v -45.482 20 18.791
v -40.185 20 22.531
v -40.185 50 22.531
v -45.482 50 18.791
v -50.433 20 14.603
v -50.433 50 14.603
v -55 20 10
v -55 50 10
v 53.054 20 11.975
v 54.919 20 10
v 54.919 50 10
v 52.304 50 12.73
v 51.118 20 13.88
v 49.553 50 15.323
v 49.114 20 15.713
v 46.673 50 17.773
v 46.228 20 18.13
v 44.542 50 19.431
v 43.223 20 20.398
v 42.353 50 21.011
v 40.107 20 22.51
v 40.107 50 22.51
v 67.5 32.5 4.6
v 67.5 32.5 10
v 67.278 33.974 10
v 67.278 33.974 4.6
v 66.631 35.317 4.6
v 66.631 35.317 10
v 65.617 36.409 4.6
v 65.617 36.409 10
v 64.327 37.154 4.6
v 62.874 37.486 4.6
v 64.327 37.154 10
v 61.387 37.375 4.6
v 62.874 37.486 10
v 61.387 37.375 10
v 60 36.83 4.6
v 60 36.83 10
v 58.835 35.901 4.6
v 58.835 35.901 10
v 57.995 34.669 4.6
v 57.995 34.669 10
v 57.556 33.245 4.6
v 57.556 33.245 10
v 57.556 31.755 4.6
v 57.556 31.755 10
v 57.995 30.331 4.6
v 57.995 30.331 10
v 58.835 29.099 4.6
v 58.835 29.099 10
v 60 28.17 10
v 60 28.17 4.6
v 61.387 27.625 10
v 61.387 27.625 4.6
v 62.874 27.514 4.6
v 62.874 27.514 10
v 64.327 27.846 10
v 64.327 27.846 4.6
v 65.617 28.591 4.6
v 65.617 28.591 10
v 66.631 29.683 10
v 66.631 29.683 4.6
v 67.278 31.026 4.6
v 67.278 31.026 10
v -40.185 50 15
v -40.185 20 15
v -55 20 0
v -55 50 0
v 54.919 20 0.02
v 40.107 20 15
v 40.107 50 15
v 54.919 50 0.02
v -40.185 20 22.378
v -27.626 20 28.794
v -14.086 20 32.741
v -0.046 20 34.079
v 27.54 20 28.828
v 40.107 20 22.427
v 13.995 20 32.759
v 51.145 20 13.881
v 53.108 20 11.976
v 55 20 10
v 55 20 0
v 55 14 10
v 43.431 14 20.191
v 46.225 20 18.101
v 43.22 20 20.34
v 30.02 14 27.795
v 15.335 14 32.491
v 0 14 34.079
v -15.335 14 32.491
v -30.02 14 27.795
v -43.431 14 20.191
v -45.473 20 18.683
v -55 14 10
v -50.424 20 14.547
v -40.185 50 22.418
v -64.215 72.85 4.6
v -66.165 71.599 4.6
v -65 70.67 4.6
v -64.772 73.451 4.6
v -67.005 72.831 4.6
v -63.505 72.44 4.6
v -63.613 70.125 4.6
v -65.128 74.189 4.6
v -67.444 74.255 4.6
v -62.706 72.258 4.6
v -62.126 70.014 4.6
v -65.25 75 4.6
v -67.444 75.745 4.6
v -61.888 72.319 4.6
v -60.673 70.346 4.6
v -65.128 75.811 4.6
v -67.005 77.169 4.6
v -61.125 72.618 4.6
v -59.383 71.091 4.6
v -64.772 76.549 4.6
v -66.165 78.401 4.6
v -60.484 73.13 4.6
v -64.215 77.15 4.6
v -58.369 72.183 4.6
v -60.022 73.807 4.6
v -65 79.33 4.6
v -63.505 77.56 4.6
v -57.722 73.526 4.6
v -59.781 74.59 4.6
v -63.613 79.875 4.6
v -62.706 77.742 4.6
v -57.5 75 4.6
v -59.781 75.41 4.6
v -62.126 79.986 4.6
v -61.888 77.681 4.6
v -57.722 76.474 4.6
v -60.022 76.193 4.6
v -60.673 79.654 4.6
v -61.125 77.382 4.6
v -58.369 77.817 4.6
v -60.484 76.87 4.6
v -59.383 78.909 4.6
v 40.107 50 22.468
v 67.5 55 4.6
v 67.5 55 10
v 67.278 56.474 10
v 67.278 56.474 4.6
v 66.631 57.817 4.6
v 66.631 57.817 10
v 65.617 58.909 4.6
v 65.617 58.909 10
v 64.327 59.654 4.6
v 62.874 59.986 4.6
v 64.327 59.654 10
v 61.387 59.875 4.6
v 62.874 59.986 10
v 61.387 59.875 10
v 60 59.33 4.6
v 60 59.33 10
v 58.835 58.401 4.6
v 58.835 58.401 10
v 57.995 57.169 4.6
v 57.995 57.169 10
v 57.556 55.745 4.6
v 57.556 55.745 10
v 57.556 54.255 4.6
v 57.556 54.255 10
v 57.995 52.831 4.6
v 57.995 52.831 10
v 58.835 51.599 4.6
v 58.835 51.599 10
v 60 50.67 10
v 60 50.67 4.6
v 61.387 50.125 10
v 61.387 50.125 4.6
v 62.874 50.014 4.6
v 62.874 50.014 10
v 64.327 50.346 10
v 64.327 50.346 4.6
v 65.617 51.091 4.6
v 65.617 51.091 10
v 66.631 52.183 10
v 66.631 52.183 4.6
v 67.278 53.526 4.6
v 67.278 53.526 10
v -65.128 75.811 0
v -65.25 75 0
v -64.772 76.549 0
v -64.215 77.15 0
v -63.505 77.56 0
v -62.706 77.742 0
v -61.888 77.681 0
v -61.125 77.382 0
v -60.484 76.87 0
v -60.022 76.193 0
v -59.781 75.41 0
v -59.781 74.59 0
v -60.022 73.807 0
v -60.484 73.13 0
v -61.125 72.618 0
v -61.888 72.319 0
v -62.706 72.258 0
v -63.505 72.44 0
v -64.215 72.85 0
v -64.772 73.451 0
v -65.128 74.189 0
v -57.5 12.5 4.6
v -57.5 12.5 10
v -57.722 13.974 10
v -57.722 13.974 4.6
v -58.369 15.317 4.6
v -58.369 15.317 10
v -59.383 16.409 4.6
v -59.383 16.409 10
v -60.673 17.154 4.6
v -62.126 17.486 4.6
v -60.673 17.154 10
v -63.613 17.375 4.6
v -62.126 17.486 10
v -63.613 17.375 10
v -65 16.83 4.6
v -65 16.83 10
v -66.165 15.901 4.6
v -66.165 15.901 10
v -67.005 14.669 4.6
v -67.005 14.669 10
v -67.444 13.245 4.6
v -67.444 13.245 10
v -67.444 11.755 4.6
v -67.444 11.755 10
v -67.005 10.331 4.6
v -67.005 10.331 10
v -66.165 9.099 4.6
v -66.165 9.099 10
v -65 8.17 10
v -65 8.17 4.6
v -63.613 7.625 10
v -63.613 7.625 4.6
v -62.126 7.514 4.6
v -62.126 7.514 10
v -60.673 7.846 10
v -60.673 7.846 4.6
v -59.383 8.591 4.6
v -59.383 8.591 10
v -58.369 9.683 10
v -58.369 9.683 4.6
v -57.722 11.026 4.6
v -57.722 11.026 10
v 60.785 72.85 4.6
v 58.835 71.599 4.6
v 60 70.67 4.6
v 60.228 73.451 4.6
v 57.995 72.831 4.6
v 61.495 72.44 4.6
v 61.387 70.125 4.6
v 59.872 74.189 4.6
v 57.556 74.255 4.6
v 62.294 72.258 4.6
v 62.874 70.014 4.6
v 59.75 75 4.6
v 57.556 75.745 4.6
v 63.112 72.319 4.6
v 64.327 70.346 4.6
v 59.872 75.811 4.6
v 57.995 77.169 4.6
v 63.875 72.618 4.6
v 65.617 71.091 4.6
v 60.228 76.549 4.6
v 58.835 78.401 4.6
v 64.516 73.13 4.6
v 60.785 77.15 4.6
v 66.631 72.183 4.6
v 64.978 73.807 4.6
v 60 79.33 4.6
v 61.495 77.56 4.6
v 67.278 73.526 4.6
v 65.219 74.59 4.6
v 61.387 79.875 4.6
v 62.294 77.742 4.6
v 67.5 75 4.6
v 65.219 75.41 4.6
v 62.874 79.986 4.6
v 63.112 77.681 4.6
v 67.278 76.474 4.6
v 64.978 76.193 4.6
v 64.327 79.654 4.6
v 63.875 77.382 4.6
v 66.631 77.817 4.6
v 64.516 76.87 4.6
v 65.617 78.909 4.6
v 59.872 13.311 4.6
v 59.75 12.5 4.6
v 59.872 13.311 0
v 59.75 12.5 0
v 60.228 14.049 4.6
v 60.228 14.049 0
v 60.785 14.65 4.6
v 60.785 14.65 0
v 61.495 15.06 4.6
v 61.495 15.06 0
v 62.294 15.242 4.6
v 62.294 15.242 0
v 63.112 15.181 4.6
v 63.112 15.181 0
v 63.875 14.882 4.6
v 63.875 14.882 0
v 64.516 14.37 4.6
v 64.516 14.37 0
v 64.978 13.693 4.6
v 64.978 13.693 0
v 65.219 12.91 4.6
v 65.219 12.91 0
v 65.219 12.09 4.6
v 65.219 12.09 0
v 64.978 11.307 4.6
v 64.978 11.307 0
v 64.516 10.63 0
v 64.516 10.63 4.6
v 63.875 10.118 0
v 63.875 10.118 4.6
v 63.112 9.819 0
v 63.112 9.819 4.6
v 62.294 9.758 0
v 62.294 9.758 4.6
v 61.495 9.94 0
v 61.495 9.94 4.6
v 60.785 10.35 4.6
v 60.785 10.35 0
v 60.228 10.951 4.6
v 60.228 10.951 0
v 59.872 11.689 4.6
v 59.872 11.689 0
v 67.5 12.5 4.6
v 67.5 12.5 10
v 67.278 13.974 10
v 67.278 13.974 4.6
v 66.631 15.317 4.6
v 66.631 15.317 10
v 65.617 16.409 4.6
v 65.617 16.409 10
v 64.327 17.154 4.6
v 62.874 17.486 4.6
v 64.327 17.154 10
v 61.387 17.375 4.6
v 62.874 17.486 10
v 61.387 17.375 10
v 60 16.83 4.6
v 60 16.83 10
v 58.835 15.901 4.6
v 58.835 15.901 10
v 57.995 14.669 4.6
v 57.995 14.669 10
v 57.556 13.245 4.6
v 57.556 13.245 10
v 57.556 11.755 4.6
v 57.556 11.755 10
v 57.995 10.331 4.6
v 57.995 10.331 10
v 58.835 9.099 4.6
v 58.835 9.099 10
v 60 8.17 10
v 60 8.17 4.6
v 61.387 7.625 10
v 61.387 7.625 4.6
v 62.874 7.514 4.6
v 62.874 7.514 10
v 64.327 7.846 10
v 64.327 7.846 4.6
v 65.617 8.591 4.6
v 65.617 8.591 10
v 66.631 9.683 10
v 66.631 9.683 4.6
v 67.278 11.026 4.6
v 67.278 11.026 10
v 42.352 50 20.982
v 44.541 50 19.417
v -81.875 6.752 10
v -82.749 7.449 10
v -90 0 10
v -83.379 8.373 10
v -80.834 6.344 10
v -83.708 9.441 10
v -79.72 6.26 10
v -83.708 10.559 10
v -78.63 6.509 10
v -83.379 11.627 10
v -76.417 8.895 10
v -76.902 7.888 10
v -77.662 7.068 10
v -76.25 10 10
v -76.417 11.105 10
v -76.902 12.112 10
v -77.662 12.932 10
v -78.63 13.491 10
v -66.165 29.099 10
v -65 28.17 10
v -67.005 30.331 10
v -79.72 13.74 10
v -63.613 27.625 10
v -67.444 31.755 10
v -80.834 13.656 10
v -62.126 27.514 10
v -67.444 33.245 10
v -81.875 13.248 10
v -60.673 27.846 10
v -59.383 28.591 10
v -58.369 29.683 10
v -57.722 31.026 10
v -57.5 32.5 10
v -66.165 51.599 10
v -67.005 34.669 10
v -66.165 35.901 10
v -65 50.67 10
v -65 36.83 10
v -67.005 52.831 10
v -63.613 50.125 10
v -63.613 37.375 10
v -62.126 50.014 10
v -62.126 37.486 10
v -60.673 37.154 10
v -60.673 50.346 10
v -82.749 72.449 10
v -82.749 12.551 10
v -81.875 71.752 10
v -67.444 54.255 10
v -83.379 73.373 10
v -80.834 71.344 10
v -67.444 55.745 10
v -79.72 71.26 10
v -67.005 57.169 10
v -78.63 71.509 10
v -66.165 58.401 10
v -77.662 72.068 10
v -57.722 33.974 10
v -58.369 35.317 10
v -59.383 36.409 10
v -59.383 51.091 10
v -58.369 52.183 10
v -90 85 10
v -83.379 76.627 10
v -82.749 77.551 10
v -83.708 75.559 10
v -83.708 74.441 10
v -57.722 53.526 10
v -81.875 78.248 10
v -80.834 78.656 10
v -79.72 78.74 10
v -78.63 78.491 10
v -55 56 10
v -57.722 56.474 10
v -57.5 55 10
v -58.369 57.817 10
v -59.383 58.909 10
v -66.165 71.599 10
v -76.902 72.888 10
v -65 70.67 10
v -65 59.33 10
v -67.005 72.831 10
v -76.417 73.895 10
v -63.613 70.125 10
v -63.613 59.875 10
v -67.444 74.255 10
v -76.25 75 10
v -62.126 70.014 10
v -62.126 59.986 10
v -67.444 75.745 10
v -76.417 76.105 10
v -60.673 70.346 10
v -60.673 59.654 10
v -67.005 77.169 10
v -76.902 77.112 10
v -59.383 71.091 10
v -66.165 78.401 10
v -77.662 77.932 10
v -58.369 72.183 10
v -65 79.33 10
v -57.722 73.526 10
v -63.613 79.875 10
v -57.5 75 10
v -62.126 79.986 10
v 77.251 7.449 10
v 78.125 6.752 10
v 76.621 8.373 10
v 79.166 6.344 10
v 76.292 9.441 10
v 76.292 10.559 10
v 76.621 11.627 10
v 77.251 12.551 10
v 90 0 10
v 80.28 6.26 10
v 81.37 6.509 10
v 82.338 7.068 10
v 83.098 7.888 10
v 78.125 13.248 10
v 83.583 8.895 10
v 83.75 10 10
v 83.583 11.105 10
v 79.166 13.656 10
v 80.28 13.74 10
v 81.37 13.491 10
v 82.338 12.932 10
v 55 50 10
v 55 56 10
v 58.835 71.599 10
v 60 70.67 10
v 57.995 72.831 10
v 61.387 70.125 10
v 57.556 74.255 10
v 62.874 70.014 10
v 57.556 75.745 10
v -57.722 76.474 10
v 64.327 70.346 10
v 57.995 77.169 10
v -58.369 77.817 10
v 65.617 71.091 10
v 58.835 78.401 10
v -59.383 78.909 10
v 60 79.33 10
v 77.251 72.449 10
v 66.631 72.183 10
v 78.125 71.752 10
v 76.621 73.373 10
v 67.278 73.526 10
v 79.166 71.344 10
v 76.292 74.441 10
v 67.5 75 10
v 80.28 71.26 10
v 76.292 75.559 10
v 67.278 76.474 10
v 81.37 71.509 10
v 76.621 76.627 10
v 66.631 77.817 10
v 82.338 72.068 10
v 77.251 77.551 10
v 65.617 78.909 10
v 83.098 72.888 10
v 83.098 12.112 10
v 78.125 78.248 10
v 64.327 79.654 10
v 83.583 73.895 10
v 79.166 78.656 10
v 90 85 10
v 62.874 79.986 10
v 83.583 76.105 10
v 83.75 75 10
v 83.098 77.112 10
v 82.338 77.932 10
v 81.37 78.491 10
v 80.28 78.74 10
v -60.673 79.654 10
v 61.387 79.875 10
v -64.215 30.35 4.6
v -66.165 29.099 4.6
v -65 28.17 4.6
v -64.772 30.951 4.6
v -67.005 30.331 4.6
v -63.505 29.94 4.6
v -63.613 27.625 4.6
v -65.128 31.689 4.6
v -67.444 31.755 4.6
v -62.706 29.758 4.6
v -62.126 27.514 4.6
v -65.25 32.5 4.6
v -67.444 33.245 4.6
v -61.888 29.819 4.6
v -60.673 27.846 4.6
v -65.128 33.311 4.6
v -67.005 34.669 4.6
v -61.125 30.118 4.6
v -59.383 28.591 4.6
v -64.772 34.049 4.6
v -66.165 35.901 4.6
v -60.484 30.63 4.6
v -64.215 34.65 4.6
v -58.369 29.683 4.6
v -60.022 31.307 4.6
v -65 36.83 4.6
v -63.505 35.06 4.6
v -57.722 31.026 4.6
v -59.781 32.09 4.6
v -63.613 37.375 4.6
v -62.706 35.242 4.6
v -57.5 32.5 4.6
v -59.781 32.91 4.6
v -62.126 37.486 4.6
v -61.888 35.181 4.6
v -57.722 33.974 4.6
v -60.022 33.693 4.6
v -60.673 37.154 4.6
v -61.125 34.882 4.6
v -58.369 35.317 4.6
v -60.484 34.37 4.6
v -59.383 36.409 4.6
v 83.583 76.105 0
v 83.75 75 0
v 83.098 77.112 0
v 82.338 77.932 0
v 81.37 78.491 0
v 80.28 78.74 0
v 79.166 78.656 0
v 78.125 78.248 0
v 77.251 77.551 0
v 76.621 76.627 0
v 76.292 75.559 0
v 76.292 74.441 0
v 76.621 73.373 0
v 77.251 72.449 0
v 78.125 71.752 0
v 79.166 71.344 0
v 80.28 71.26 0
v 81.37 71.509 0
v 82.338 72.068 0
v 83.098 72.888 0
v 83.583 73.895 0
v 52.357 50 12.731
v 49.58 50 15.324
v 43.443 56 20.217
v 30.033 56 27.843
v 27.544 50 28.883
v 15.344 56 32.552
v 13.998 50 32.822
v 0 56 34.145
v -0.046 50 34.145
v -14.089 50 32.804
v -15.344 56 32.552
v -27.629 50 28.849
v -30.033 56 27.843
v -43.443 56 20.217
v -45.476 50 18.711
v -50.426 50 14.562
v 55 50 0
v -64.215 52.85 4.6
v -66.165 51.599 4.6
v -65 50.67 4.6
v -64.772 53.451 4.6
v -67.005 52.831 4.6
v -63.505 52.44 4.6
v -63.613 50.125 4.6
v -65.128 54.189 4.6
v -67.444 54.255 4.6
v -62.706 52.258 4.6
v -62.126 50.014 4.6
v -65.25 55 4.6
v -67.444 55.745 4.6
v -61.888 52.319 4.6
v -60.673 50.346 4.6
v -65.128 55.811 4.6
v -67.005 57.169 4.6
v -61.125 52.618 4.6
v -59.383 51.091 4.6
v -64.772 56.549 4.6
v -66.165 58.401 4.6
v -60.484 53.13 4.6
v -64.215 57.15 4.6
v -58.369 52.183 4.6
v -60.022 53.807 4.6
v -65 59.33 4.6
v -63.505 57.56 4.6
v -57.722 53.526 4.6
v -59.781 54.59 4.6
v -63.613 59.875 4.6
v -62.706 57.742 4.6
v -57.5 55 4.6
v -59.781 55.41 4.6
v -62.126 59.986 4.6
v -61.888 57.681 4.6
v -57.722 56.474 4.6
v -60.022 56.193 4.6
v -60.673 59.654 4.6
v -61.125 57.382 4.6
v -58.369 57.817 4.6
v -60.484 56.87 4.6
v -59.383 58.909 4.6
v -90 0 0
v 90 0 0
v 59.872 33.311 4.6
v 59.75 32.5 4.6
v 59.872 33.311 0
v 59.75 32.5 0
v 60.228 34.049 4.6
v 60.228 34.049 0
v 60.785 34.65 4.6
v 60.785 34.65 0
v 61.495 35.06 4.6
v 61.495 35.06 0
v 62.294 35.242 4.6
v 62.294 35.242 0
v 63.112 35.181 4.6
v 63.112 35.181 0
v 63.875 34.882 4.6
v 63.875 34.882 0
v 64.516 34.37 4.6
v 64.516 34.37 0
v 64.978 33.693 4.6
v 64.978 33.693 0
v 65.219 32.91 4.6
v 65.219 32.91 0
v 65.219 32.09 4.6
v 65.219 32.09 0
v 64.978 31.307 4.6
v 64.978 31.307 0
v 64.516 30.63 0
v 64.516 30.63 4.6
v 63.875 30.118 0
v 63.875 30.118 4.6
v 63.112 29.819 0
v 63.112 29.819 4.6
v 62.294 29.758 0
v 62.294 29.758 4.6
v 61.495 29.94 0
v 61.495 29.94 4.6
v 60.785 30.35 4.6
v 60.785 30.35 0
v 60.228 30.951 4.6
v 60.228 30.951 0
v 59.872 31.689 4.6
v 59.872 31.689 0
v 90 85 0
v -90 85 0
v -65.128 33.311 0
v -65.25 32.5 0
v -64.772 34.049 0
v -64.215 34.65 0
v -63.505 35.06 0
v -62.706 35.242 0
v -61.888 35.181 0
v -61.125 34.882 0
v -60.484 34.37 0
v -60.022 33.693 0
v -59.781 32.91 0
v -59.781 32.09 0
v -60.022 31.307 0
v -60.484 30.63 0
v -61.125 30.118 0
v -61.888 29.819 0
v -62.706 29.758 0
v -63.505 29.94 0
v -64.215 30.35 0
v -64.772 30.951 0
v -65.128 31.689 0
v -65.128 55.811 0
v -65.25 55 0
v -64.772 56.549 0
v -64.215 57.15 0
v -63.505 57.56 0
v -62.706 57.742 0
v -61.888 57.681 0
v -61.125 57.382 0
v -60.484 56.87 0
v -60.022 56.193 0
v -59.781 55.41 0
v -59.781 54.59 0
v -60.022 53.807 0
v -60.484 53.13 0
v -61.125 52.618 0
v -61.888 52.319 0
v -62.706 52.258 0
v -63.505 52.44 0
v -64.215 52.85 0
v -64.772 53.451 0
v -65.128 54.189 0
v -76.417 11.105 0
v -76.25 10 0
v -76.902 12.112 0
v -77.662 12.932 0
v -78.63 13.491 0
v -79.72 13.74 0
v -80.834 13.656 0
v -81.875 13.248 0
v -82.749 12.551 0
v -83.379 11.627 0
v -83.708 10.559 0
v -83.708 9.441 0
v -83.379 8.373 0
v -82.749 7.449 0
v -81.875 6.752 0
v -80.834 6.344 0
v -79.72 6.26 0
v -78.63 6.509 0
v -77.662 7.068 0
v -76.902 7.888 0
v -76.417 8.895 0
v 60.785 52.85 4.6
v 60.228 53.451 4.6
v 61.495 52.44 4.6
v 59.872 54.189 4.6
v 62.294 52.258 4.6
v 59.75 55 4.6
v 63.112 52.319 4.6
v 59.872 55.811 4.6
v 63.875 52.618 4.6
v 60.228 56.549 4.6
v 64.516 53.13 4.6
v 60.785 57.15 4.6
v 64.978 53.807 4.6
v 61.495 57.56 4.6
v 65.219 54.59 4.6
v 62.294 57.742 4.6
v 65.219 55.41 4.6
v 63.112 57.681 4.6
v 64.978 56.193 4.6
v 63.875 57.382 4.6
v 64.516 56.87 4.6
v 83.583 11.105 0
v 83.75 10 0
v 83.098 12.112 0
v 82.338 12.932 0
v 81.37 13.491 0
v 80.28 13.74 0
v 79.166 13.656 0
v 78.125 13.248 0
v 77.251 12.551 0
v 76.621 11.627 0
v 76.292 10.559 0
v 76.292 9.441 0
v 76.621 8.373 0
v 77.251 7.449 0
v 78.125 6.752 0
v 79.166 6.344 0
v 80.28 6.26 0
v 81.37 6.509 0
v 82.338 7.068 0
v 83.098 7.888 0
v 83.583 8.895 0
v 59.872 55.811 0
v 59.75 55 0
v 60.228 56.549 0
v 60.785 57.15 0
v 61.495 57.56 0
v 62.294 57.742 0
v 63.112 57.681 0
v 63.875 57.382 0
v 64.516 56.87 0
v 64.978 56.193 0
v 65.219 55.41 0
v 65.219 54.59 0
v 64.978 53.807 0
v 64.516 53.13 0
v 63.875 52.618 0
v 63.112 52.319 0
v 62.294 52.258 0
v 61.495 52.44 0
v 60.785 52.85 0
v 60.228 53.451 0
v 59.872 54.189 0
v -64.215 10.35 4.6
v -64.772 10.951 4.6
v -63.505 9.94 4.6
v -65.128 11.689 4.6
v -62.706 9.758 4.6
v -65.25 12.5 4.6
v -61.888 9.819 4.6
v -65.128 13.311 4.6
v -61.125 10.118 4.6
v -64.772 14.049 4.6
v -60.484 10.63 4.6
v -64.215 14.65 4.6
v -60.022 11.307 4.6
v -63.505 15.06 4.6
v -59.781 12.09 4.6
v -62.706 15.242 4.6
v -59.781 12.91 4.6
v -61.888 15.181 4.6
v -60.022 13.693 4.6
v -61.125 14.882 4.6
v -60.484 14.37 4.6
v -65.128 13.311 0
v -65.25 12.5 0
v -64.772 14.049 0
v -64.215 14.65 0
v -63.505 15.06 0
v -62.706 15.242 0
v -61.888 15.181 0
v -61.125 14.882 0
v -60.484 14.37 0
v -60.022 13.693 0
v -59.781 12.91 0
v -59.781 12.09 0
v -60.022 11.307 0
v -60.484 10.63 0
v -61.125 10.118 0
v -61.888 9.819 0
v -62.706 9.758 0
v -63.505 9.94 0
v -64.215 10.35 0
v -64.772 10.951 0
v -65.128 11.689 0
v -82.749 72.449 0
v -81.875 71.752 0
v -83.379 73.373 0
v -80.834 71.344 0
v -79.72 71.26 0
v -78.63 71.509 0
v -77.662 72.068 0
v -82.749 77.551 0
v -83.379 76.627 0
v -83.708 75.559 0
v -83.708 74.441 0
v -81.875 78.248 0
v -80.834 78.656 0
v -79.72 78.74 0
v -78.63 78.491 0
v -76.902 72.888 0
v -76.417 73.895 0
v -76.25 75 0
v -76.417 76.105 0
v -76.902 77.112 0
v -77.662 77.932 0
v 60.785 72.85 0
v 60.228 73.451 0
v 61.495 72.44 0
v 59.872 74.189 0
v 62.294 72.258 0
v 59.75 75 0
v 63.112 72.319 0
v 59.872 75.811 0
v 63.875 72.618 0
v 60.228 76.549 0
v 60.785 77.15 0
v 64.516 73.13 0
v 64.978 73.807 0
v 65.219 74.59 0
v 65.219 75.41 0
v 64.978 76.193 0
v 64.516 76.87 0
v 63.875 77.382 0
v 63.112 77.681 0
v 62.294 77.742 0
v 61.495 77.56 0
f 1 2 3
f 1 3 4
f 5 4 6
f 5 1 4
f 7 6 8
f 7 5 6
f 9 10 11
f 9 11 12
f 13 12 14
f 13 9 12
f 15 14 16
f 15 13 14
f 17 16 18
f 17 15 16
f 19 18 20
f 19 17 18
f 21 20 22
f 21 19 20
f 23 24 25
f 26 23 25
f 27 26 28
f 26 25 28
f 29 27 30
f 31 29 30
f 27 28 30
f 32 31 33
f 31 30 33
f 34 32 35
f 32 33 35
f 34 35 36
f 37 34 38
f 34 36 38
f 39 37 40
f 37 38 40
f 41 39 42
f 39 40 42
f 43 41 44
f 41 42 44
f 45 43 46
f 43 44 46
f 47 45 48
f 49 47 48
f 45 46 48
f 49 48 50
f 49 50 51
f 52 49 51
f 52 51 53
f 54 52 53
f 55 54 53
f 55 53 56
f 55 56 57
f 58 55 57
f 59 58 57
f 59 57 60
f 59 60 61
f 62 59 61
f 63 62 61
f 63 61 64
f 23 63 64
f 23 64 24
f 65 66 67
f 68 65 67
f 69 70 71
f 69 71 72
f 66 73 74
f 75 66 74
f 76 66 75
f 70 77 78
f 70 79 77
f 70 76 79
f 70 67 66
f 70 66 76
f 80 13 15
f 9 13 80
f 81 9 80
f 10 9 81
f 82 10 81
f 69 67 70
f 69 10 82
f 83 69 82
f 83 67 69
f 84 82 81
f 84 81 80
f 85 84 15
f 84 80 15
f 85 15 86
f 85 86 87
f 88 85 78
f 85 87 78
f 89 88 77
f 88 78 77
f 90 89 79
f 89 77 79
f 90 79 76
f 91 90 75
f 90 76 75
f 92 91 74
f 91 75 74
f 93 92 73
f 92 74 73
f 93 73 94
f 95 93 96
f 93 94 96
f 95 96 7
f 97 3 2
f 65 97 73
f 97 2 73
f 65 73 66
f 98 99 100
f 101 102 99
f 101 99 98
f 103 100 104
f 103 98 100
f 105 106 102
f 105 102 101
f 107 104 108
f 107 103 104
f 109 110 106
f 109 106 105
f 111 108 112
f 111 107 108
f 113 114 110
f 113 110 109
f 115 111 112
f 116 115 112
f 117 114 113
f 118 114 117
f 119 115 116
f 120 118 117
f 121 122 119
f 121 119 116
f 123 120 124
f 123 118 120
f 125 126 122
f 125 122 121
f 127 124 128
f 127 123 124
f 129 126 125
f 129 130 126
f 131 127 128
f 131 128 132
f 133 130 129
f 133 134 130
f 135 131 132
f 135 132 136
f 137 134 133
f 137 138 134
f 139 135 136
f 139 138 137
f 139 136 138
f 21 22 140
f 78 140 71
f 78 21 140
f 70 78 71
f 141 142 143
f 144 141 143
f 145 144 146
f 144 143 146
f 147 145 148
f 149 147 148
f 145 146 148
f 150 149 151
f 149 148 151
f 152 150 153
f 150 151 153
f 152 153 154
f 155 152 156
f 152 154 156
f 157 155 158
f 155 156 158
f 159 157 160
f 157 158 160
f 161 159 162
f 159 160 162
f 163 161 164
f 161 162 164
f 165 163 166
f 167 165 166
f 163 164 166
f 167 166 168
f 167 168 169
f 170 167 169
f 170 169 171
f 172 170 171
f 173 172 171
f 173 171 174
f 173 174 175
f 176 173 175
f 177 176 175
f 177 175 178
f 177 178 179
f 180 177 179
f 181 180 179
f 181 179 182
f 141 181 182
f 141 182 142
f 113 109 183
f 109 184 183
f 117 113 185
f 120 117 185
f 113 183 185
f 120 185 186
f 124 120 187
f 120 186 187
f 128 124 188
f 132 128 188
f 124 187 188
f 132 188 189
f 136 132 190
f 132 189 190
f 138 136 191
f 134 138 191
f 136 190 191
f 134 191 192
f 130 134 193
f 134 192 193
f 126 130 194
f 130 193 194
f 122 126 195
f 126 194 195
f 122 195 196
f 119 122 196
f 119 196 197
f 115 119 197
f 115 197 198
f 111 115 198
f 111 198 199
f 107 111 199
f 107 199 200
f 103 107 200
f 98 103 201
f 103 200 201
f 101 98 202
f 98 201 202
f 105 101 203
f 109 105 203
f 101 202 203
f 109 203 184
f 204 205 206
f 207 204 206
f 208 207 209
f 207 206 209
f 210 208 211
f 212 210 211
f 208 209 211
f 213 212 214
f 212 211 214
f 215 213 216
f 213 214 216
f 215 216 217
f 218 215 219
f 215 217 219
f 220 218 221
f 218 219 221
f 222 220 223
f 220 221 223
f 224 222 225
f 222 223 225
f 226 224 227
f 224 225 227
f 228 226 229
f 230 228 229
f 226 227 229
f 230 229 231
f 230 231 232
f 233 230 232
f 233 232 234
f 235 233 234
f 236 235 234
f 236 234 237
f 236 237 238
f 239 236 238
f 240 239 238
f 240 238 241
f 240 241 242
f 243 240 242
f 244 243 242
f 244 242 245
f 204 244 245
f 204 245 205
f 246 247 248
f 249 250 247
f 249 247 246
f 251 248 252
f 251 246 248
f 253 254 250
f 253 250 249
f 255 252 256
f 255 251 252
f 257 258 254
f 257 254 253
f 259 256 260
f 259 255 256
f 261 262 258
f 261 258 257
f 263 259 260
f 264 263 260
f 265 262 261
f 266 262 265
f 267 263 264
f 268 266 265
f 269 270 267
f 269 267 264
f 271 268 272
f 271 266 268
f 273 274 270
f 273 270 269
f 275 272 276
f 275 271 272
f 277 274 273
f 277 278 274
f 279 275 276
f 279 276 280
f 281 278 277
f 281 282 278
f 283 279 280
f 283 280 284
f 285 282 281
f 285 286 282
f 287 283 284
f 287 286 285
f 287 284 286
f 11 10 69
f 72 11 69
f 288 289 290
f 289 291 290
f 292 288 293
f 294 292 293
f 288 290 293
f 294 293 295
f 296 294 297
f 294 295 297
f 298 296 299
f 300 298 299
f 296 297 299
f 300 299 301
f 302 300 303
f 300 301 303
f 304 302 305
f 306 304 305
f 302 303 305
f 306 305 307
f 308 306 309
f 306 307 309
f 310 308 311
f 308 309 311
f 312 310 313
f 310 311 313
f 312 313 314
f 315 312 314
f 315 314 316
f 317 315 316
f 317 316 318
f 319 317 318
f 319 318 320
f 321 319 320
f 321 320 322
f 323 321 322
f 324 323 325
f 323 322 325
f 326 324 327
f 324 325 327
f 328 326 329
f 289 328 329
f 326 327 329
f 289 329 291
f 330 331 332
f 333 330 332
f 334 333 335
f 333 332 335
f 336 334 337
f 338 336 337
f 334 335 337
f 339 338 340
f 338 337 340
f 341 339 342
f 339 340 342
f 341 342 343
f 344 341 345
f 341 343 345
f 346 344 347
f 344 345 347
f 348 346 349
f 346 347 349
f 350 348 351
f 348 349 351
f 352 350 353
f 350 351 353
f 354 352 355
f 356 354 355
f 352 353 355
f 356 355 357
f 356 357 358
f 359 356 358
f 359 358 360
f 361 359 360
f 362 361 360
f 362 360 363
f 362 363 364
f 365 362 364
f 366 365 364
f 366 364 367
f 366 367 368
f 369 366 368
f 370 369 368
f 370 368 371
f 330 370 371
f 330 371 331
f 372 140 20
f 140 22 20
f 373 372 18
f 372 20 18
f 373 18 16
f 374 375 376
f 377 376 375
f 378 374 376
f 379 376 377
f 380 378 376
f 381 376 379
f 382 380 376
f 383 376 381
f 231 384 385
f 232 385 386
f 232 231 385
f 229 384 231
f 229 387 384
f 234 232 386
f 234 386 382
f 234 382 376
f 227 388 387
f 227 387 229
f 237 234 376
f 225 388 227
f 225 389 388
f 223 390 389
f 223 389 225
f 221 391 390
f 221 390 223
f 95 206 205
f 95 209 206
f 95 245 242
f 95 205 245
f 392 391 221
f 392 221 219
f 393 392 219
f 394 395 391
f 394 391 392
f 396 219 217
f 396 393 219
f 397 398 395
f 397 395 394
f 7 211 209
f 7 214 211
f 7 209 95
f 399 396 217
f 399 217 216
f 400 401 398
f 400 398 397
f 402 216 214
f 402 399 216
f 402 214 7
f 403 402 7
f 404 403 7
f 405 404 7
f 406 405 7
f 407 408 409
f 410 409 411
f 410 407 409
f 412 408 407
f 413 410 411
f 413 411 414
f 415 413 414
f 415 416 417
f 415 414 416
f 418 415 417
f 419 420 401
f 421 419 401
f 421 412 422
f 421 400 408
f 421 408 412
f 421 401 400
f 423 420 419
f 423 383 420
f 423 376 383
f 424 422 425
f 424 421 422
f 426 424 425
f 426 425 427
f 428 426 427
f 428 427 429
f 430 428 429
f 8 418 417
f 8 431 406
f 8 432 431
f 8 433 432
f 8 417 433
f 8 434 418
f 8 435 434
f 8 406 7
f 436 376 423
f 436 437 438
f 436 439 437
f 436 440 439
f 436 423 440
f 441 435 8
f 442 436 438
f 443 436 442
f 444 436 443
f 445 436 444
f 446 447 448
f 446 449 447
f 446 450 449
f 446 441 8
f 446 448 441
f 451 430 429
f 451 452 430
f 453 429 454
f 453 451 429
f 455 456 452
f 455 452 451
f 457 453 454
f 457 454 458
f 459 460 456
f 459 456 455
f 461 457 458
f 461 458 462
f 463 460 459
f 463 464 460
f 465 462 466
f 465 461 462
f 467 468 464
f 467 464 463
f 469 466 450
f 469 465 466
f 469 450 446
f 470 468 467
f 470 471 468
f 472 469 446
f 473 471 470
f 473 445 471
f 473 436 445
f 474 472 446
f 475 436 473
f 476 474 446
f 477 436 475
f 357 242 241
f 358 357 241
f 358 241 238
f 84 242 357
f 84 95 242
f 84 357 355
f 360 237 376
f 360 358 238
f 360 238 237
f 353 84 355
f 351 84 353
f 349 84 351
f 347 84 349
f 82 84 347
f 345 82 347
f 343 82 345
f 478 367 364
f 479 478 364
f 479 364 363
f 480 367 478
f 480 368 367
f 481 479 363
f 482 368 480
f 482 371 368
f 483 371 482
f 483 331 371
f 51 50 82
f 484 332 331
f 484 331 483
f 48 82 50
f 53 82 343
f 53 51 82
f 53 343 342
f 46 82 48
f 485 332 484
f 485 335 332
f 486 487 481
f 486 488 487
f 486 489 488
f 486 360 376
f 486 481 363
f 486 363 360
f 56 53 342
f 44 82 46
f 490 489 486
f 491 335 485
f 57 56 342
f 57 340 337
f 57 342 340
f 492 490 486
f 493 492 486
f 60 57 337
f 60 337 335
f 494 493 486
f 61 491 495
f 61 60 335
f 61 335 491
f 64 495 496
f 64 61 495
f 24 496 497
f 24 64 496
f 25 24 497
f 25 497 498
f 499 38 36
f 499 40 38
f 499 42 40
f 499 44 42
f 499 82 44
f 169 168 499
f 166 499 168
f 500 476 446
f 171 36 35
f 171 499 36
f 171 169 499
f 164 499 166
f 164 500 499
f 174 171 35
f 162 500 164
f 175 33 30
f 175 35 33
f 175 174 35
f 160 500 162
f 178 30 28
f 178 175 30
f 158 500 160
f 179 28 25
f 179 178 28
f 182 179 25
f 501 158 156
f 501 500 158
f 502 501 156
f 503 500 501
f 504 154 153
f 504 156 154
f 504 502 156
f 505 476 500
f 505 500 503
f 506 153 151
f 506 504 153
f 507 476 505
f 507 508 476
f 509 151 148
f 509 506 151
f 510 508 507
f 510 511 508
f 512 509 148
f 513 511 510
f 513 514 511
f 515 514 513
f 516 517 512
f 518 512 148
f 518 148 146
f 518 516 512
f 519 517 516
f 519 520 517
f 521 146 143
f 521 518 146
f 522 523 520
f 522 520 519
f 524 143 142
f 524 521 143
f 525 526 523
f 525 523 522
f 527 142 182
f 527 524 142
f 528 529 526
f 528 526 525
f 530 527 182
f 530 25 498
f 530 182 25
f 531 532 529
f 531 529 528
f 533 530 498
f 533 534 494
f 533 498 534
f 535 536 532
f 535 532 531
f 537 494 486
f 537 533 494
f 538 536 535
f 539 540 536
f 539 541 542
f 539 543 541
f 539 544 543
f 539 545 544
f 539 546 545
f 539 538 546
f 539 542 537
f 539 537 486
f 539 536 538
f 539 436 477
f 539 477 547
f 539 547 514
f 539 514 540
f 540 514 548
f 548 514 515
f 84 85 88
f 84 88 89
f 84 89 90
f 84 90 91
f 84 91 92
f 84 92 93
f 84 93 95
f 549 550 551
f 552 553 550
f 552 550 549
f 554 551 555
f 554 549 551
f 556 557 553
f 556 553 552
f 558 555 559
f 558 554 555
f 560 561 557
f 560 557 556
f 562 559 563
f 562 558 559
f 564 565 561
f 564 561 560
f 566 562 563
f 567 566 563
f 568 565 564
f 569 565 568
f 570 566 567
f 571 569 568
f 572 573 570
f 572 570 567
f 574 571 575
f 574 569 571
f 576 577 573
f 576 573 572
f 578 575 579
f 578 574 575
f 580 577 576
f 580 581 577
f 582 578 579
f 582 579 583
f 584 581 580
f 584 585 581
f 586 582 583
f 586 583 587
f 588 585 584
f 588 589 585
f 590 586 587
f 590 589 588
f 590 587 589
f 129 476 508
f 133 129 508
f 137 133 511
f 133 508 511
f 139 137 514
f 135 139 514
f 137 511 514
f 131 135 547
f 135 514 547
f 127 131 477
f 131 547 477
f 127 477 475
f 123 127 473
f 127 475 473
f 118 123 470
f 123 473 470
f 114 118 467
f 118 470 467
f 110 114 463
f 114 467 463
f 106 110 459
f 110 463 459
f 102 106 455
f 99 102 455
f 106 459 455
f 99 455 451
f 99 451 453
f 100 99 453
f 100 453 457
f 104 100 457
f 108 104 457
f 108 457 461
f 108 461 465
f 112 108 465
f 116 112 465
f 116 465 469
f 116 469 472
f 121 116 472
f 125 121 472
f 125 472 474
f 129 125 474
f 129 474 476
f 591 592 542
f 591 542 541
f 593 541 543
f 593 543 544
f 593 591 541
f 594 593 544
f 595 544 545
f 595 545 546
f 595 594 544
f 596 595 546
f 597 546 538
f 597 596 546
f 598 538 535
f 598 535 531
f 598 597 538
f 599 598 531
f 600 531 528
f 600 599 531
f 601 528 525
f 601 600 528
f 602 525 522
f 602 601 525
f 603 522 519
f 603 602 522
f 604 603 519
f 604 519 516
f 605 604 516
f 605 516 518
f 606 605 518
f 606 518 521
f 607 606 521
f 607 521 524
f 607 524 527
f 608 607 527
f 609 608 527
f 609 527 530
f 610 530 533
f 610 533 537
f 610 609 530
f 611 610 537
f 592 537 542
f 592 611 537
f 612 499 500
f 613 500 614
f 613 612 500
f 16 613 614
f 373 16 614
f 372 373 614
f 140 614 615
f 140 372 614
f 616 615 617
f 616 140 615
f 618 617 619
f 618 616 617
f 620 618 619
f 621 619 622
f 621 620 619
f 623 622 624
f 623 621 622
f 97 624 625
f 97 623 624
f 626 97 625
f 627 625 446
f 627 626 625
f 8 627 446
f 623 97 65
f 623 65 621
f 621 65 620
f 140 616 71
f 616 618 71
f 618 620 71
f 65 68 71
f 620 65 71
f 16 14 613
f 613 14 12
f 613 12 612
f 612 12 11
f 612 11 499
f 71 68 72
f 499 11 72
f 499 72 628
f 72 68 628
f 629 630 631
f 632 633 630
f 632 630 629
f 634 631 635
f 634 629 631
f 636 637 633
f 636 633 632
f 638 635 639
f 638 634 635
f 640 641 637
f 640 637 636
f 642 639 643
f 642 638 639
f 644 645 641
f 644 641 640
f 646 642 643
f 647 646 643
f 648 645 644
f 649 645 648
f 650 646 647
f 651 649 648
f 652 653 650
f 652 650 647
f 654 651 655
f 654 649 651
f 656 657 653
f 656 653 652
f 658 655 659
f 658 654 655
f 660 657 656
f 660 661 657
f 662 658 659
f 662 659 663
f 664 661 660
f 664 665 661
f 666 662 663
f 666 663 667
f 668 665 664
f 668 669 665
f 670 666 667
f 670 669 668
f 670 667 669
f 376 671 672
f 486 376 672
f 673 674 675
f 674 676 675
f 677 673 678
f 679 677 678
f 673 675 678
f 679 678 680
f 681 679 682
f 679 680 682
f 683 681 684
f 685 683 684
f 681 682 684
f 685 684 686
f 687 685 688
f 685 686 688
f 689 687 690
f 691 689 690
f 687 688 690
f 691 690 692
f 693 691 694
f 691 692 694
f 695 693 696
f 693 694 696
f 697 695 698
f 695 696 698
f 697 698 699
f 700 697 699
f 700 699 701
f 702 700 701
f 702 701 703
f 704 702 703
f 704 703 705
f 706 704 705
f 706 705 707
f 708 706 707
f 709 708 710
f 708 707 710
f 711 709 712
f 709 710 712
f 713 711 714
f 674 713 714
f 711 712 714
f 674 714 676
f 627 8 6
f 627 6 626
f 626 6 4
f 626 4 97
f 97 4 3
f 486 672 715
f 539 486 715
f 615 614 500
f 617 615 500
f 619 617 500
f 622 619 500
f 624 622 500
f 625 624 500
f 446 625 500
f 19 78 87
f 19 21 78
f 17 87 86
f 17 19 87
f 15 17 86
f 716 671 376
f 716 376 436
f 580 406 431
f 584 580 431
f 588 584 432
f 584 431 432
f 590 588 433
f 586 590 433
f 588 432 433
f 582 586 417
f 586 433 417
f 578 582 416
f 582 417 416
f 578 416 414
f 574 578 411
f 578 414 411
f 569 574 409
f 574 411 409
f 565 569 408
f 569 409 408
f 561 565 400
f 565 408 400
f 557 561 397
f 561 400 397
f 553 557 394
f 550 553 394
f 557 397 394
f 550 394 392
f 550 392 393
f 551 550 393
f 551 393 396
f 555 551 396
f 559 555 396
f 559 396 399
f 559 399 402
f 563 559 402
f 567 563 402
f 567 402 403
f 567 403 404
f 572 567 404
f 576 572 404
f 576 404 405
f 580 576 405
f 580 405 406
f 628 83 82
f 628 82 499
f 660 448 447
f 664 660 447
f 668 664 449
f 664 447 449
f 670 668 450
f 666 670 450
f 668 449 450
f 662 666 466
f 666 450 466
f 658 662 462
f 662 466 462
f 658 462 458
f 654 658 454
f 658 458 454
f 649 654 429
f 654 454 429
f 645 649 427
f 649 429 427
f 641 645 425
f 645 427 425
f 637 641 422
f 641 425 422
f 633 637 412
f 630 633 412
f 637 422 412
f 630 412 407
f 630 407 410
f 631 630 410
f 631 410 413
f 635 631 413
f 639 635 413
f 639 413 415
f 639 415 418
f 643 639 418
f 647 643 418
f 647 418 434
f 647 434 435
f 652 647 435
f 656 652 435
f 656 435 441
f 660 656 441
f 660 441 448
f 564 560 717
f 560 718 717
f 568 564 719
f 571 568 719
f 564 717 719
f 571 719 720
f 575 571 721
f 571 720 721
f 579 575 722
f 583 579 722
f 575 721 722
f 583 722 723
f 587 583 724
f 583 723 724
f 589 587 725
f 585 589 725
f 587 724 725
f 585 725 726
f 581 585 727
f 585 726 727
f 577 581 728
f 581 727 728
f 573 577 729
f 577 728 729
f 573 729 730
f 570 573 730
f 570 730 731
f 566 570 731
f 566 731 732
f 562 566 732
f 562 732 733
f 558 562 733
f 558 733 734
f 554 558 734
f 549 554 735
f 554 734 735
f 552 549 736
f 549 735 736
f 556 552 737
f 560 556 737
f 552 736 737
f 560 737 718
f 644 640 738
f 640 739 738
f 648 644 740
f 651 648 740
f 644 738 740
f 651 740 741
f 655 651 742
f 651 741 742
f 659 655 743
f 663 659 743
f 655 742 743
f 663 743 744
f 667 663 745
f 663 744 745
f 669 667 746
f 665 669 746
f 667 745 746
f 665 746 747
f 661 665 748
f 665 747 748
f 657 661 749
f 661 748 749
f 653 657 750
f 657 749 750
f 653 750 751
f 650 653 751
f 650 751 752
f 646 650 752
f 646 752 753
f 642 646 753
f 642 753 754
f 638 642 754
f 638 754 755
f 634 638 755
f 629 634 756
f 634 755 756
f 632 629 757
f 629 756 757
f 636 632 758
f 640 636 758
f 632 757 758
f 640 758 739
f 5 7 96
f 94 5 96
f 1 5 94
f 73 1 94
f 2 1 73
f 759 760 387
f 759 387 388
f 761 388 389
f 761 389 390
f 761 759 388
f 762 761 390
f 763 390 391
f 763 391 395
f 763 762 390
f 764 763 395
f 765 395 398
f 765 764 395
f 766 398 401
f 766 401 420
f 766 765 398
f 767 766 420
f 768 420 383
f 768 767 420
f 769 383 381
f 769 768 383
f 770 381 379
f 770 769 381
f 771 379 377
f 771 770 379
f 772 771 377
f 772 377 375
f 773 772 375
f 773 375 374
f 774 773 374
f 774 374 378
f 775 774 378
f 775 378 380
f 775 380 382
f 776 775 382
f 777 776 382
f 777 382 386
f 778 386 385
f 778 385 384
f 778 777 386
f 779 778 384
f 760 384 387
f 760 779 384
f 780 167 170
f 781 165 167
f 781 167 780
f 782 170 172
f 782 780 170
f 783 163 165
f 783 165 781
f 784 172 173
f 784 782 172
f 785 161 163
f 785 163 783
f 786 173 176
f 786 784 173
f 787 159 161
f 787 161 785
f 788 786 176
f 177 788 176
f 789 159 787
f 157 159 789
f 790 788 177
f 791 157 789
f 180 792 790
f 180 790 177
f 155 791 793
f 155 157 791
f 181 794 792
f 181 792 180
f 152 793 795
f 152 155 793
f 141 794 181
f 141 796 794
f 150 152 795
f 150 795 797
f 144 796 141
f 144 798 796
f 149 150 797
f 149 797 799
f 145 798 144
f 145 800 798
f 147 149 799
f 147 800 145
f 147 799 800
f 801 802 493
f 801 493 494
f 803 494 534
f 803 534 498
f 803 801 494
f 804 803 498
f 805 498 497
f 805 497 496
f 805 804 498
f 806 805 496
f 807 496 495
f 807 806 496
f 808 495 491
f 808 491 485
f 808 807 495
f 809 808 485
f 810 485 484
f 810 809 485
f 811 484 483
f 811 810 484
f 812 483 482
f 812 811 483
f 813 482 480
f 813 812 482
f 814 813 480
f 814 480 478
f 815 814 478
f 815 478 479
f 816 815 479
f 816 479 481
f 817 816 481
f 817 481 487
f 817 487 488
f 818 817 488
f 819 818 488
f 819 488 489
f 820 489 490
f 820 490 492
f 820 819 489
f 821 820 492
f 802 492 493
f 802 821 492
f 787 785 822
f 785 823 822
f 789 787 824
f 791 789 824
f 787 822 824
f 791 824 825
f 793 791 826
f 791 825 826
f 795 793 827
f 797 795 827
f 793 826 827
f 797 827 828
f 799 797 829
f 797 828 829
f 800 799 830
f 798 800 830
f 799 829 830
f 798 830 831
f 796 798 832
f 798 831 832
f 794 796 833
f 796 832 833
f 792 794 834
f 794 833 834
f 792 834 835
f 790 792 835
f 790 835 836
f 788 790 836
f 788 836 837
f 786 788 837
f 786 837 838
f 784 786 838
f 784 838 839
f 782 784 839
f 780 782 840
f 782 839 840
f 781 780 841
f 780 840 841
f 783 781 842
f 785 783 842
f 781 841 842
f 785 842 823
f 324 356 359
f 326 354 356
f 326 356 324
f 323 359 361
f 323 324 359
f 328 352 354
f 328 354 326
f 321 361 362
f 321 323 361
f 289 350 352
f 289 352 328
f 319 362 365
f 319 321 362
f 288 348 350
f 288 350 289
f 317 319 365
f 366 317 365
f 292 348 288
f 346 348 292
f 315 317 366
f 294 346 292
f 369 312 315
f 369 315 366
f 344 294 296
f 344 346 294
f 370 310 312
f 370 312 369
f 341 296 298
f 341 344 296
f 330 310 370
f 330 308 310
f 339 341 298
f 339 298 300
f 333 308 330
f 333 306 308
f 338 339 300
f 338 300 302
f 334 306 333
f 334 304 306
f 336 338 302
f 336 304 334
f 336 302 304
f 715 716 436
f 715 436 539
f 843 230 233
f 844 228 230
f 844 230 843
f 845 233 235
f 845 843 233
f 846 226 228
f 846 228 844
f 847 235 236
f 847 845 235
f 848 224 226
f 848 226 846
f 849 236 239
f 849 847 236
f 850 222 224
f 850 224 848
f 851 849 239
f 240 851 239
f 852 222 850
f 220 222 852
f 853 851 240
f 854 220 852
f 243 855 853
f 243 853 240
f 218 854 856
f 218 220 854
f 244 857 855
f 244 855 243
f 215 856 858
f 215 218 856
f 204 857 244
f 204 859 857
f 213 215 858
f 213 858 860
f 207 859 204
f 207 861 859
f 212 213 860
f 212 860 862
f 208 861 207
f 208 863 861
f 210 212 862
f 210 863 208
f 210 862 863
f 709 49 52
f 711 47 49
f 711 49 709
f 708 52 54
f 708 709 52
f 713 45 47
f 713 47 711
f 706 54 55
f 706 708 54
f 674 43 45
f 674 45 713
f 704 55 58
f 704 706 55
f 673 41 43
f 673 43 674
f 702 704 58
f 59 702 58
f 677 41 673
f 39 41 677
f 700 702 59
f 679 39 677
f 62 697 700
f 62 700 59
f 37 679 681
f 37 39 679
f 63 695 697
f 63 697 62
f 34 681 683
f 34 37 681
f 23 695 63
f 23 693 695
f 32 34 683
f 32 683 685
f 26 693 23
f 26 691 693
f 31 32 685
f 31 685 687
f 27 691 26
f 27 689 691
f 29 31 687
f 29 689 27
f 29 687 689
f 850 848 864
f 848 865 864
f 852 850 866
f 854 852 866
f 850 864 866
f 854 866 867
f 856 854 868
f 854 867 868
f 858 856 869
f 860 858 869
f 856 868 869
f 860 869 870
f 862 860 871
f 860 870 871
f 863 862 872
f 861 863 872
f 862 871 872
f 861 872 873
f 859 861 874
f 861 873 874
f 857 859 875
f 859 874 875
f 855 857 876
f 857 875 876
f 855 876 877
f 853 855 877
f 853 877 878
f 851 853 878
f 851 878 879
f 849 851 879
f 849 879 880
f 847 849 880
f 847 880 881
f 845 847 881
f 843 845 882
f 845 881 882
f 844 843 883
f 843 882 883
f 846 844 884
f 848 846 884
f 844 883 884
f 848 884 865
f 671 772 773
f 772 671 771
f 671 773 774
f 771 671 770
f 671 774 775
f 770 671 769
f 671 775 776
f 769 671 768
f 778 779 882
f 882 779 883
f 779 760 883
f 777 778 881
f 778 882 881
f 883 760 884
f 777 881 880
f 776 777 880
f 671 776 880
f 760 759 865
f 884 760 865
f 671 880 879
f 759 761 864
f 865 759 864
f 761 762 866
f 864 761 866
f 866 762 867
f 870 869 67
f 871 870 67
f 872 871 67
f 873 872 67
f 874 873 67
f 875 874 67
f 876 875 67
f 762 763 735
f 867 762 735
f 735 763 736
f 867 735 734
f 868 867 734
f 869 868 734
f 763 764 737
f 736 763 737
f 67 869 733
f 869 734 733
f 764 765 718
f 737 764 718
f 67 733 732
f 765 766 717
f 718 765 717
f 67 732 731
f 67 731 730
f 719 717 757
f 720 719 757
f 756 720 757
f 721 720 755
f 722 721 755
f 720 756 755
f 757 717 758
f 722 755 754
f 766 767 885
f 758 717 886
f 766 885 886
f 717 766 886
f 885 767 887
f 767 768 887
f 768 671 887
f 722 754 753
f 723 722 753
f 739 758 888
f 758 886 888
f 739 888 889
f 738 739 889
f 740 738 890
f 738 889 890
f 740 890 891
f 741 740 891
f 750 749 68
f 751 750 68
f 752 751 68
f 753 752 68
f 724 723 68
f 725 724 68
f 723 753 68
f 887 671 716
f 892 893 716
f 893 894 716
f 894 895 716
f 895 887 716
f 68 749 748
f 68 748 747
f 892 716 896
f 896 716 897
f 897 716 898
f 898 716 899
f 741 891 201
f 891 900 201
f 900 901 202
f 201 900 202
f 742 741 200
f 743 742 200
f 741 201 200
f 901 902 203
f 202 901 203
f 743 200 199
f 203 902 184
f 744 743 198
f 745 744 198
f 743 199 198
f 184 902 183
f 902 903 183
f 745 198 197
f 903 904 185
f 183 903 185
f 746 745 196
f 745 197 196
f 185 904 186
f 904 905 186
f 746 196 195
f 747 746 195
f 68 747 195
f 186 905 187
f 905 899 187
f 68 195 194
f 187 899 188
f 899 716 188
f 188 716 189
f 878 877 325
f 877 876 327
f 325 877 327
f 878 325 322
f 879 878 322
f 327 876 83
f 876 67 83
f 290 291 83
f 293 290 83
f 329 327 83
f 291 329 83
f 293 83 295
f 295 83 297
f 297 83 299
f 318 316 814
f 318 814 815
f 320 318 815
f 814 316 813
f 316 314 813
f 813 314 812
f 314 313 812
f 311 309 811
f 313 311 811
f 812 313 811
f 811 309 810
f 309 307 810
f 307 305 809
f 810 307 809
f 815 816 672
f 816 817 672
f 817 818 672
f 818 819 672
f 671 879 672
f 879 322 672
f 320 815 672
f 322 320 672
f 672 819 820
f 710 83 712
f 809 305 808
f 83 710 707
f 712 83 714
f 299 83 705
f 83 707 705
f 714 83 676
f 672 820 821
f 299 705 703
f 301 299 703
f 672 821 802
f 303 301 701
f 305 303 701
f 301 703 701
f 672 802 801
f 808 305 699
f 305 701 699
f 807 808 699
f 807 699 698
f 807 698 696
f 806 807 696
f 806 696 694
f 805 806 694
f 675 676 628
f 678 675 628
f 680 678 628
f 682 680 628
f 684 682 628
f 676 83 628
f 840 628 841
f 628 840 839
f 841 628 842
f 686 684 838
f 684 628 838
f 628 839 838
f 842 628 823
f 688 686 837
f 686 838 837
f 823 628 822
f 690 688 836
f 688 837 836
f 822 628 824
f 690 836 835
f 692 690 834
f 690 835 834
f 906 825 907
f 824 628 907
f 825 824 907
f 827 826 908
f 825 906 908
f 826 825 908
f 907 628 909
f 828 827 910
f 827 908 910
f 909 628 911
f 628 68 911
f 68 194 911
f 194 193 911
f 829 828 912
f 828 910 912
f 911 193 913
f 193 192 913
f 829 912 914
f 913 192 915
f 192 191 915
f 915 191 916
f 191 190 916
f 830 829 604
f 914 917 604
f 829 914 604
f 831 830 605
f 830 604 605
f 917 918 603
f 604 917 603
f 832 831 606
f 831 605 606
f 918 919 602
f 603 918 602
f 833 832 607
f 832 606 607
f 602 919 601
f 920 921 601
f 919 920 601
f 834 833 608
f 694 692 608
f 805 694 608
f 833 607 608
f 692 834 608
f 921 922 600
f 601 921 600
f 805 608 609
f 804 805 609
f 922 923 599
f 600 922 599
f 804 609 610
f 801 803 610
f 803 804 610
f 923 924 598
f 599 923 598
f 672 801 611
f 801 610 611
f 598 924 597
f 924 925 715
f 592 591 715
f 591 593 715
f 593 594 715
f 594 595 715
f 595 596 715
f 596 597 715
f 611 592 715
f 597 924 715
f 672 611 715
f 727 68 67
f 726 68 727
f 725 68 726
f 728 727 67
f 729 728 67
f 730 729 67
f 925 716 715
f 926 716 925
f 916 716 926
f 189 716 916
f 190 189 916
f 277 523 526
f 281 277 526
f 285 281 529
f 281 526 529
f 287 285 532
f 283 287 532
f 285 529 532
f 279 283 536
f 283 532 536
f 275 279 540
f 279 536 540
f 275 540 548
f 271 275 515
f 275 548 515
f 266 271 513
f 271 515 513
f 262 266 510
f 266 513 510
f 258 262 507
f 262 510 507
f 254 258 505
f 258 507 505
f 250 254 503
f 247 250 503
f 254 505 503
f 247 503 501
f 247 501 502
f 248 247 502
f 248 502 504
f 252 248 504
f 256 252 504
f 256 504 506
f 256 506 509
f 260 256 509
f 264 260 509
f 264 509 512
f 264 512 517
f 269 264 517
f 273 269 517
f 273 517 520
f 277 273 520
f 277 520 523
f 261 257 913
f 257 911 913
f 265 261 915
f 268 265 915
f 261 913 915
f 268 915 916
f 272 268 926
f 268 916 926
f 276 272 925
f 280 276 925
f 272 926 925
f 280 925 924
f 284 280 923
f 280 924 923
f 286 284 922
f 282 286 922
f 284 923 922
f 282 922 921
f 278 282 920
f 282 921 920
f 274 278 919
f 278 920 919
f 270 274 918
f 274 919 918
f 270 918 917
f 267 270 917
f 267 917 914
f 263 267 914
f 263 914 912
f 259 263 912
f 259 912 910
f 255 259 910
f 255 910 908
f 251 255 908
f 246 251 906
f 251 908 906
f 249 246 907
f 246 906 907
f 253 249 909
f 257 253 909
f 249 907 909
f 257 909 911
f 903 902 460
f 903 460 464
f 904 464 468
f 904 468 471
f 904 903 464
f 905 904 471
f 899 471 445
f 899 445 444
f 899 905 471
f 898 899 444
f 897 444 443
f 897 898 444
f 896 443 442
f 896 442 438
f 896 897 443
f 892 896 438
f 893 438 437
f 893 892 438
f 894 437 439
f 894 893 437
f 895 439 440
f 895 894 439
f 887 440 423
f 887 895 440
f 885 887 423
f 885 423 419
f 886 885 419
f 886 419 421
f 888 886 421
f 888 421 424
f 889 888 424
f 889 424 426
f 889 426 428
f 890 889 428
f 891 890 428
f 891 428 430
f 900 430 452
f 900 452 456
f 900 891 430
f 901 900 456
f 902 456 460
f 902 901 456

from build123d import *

# Parameters (mm, degrees)
SKETCH005_W         = 180
SKETCH005_H         = 85
SKETCH005_R         = 3.75
SKETCH005_W_2       = 110
SKETCH005_H_2       = 30
PAD005_DEPTH        = 10
PAD006_DEPTH        = 6
PAD007_DEPTH        = 6
HOLE005_D           = 5.5
HOLE005_DEPTH       = 25
HOLE005_CBORE_D     = 10
HOLE005_CBORE_DEPTH = 5.4
PAD025_DEPTH        = 30


with BuildPart() as part:
    # Sketch005 → Pad005 (new body)
    with BuildSketch(Plane.XY):
        with Locations((0, 42.5)):
            Rectangle(SKETCH005_W, SKETCH005_H)
        with Locations((-80, 75)):
            Circle(SKETCH005_R, mode=Mode.SUBTRACT)
        with Locations((80, 75)):
            Circle(SKETCH005_R, mode=Mode.SUBTRACT)
        with Locations((-80, 10)):
            Circle(SKETCH005_R, mode=Mode.SUBTRACT)
        with Locations((80, 10)):
            Circle(SKETCH005_R, mode=Mode.SUBTRACT)
        with Locations((0, 35)):
            Rectangle(SKETCH005_W_2, SKETCH005_H_2, mode=Mode.SUBTRACT)
    extrude(amount=PAD005_DEPTH)

    # Sketch006 → Pad006 (join)
    with BuildSketch(Plane.XZ.offset(-20)):
        with BuildLine():
            Line((-55.000007, 9.999997), (-55.000007, 5))
            Line((-55.000007, 5), (54.999984, 5))
            Line((54.999984, 5), (54.999984, 10.000016))
            ThreePointArc((54.999984, 10.000016), (-1.6e-05, 34.078581), (-55.000007, 9.999997))
        make_face()
    extrude(amount=PAD006_DEPTH)

    # Sketch007 → Pad007 (join)
    with BuildSketch(Plane.XZ.offset(-50)):
        with BuildLine():
            Line((-55.000002, 9.999998), (-55.000002, 5))
            Line((-55.000002, 5), (54.999984, 5))
            Line((54.999984, 5), (54.999984, 10.000017))
            ThreePointArc((54.999984, 10.000017), (-1.3e-05, 34.144872), (-55.000002, 9.999998))
        make_face()
    extrude(amount=-PAD007_DEPTH)

    # Hole005
    with Locations(Plane.XY.offset(10)):
        with Locations((-62.5, 12.5), (-62.5, 32.5), (-62.5, 55), (-62.5, 75), (62.5, 12.5), (62.5, 32.5), (62.5, 55), (62.5, 75)):
            CounterBoreHole(HOLE005_D / 2, HOLE005_CBORE_D / 2, HOLE005_CBORE_DEPTH, depth=HOLE005_DEPTH)

    # Sketch046 → Pad025 (join)
    with BuildSketch(Plane.XZ.offset(-20)):
        with BuildLine():
            ThreePointArc((54.919348, 9.999997), (47.923207, 16.740644), (40.107089, 22.510446))
            Line((40.107089, 22.510446), (40.107089, 15.000094))
            Line((40.107089, 15.000094), (54.919348, 0.019657))
            Line((54.919348, 9.999997), (54.919348, 0.019657))
        make_face()
        with BuildLine():
            ThreePointArc((-40.185018, 22.531307), (-48.003192, 16.751155), (-55.000021, 9.999978))
            Line((-55.000021, 0), (-55.000021, 9.999978))
            Line((-40.185018, 15), (-55.000021, 0))
            Line((-40.185018, 22.531307), (-40.185018, 15))
        make_face()
    extrude(amount=-PAD025_DEPTH)


solid = part.part
